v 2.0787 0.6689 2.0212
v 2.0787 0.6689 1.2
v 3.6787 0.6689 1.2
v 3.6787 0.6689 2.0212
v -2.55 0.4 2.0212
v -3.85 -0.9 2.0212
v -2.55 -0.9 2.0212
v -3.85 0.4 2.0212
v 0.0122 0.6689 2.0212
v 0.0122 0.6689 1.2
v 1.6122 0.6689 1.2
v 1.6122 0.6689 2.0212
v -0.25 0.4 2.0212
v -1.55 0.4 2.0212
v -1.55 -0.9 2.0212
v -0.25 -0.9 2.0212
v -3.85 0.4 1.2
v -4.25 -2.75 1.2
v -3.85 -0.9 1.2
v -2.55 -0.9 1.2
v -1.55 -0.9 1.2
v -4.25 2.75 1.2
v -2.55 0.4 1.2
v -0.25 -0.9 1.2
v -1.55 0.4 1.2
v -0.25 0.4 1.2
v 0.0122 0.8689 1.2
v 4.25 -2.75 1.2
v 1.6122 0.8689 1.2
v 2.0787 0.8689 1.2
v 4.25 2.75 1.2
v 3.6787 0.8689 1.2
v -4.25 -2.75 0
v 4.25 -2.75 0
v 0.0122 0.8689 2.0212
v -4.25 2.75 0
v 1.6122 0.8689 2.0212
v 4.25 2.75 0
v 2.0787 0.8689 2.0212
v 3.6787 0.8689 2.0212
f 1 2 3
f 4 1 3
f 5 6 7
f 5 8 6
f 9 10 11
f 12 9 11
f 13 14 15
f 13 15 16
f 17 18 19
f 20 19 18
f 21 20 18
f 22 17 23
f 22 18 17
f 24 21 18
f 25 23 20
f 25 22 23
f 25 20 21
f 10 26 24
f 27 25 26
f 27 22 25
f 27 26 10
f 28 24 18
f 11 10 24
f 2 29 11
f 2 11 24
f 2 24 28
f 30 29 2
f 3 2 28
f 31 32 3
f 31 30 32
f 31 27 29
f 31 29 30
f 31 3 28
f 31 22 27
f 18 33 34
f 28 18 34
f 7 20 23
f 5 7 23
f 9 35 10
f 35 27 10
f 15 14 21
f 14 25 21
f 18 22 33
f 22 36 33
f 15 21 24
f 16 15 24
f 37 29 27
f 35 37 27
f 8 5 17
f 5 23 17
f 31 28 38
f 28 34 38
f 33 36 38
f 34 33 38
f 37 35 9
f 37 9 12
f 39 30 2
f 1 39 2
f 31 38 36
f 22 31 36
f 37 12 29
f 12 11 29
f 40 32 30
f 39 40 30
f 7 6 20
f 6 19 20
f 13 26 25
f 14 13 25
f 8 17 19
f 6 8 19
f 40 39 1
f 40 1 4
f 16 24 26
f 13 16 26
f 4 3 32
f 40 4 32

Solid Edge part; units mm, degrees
sketch "Sketch1" plane through (0, 0, 0) normal (0, 0, 1) x (1, 0, 0)
  line L0 (-4.25, -2.75) -> (4.25, -2.75)
  line L1 (4.25, -2.75) -> (4.25, 2.75)
  line L2 (4.25, 2.75) -> (-4.25, 2.75)
  line L3 (-4.25, 2.75) -> (-4.25, -2.75)
  dimension "D1" = 8.5
  dimension "D2" = 5.5
extrude "Protrusion1" add sketch "Sketch1" along normal blind 1.2
sketch "Sketch2" plane through (0, 0, 1.2) normal (0, 0, 1) x (1, 0, 0)
  line L0 (-3.85, -0.9) -> (-2.55, -0.9)
  line L1 (-2.55, -0.9) -> (-2.55, 0.4)
  line L2 (-2.55, 0.4) -> (-3.85, 0.4)
  line L3 (-3.85, 0.4) -> (-3.85, -0.9)
  line L4 (-0.25, -0.9) -> (-0.25, 0.4)
  line L5 (-0.25, 0.4) -> (-1.55, 0.4)
  line L6 (-1.55, 0.4) -> (-1.55, -0.9)
  line L7 (-1.55, -0.9) -> (-0.25, -0.9)
  line L8 (0.0122, 0.6689) -> (1.6122, 0.6689)
  line L9 (1.6122, 0.6689) -> (1.6122, 0.8689)
  line L10 (1.6122, 0.8689) -> (0.0122, 0.8689)
  line L11 (0.0122, 0.8689) -> (0.0122, 0.6689)
  line L12 (2.0787, 0.6689) -> (3.6787, 0.6689)
  line L13 (3.6787, 0.6689) -> (3.6787, 0.8689)
  line L14 (3.6787, 0.8689) -> (2.0787, 0.8689)
  line L15 (2.0787, 0.8689) -> (2.0787, 0.6689)
  dimension "D1" = 1.3
  dimension "D2" = 1.3
  dimension "D3" = 1.3
  dimension "D4" = 1.3
  dimension "D5" = 0.25
  dimension "D6" = 1
  dimension "D7" = 0.4
  dimension "D8" = 1.3
extrude "boutons" add sketch "Sketch2" along normal blind 0.8212
